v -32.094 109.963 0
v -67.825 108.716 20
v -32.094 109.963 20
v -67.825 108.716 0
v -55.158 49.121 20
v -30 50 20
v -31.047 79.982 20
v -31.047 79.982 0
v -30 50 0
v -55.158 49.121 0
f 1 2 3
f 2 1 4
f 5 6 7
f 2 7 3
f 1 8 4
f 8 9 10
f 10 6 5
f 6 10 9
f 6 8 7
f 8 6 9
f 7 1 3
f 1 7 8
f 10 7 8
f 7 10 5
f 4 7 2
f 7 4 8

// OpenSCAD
translate([-30,50,0])
scale([3,3,1])
rotate([0,0,+92]) {
    difference() {
        cube([20, 20, 20]);
        translate([10, 0, -1]) {
            rotate([0,0,50]) {
                cube([30, 30, 30]);
            }
        }
    }
}
